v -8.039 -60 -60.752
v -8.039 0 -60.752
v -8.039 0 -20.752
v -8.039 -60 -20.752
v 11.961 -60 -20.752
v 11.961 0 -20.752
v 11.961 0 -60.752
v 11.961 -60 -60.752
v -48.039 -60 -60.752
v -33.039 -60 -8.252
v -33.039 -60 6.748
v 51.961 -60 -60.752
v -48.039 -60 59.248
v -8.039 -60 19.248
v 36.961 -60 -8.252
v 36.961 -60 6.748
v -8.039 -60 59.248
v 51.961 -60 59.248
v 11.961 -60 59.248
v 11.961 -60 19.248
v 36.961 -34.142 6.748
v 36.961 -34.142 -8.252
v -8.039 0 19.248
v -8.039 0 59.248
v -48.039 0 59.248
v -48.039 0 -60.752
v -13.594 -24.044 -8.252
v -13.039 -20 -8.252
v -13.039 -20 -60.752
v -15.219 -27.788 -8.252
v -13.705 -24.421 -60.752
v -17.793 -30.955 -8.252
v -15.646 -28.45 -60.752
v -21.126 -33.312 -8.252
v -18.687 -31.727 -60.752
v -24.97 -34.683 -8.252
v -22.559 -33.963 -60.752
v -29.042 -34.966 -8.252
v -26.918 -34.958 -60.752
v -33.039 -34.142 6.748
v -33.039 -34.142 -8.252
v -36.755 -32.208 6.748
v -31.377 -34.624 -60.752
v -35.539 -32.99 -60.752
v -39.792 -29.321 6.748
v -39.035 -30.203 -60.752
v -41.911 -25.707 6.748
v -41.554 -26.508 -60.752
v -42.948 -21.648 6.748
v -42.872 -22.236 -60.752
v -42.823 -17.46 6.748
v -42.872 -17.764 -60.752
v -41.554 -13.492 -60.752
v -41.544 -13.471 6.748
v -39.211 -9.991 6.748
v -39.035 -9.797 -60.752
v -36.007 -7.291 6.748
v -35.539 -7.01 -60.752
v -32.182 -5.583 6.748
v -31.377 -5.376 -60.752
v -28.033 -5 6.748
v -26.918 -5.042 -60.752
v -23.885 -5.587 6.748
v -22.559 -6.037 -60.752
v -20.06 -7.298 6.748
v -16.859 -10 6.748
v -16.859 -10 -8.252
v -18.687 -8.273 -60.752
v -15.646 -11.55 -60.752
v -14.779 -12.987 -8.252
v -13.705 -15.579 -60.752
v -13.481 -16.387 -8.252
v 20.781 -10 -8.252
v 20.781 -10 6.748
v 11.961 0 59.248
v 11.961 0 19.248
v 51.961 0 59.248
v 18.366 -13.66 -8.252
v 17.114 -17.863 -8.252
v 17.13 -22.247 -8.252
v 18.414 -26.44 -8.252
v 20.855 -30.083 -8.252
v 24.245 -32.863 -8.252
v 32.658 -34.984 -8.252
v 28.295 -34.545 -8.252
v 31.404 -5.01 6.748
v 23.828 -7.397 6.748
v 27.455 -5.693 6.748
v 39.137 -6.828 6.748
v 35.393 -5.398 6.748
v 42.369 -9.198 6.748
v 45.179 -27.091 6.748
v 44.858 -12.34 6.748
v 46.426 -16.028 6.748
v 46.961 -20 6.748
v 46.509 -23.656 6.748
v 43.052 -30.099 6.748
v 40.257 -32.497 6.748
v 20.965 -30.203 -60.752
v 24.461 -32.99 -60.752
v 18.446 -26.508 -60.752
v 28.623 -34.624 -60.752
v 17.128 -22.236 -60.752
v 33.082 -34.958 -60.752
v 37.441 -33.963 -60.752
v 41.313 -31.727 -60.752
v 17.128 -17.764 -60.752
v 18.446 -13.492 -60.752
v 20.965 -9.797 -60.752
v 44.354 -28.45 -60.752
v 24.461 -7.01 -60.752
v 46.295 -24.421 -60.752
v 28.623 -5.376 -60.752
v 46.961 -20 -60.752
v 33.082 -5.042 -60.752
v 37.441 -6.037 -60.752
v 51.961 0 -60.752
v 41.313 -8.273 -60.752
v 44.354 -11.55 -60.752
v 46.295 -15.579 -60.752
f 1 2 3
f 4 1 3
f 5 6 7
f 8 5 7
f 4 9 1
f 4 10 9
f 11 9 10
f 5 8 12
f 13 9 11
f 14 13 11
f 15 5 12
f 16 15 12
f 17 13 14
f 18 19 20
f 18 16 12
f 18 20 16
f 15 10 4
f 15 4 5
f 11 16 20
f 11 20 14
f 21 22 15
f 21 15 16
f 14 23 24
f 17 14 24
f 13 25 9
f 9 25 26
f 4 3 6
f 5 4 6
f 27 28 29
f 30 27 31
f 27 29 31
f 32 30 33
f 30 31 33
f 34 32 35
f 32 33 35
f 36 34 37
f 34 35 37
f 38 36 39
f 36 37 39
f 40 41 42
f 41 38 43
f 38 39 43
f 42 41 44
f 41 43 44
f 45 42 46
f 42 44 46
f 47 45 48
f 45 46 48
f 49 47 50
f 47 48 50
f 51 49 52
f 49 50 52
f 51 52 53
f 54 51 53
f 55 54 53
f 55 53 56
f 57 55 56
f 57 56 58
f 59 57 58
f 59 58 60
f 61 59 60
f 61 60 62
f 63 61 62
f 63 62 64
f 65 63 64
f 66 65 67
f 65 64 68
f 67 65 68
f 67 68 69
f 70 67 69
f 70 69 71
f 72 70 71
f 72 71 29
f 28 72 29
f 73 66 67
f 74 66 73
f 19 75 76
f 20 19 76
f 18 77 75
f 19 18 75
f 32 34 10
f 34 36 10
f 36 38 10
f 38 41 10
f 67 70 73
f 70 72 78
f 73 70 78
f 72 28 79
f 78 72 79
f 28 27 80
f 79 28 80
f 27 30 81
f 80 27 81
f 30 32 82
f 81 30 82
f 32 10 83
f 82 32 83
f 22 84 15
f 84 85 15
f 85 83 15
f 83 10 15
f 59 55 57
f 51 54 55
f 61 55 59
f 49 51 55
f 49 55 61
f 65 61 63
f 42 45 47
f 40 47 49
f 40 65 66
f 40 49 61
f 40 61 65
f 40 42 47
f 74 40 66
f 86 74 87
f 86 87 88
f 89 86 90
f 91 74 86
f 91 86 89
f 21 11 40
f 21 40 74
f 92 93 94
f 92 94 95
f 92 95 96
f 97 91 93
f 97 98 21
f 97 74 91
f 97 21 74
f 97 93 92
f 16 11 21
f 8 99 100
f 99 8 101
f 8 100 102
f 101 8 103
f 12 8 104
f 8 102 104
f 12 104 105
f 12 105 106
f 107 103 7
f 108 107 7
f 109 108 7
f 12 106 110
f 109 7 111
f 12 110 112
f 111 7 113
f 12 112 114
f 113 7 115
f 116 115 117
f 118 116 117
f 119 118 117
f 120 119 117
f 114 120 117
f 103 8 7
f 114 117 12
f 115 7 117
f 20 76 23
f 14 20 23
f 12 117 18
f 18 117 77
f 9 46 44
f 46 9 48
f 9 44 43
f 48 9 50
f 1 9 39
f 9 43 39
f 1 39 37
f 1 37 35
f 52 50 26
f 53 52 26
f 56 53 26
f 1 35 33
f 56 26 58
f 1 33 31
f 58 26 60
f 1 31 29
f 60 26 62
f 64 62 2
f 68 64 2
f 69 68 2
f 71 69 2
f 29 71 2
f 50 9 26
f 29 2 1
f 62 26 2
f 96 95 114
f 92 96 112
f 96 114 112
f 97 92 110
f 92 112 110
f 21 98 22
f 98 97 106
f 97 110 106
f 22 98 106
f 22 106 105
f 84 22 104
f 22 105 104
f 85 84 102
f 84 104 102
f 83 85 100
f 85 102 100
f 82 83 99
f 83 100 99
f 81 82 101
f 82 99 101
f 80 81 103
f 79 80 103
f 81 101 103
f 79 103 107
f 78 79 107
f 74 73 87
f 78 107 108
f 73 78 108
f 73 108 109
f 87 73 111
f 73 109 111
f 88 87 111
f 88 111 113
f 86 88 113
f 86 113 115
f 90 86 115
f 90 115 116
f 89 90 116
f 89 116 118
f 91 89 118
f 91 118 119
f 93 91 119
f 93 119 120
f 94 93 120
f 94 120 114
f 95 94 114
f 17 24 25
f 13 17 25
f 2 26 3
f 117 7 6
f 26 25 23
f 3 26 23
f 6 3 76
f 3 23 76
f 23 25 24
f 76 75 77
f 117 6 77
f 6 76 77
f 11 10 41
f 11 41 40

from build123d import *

# Parameters (mm, degrees)
F1_DEPTH = 60
F2_W     = 70
F2_H     = 15
F3_DEPTH = 50
F4_R     = 15
F5_R     = 15
F6_DEPTH = 67.5


with BuildPart() as f1:
    # F0 (on Front) → F1 (new body)
    with BuildSketch(Plane.XZ):
        Polygon((-8.039089, 59.247605), (-48.039089, 59.247605), (-48.039089, -60.752395), (-8.039089, -60.752395), (-8.039089, -20.752395), (11.960911, -20.752395), (11.960911, -60.752395), (51.960911, -60.752395), (51.960911, 59.247605), (11.960911, 59.247605), (11.960911, 19.247605), (-8.039089, 19.247605), align=None)
    extrude(amount=F1_DEPTH)

    # F2 (on face) → F3 (cut)
    with BuildSketch(Plane.XZ.offset(60)):
        with Locations((1.960911, -0.752395)):
            Rectangle(F2_W, F2_H)
    extrude(amount=-F3_DEPTH, mode=Mode.SUBTRACT)

    # F4 (on face) + F5 (on face) → F6 (cut)
    with BuildSketch(Plane(origin=(0, 0, -60.752395), x_dir=(1, 0, 0), z_dir=(0, 0, -1))):
        with Locations((-28.039089, 20)):
            Circle(F4_R)
    with BuildSketch(Plane(origin=(0, 0, -60.752395), x_dir=(1, 0, 0), z_dir=(0, 0, -1))):
        with Locations((31.960911, 20)):
            Circle(F5_R)
    extrude(amount=-F6_DEPTH, mode=Mode.SUBTRACT)


solid = f1.part
